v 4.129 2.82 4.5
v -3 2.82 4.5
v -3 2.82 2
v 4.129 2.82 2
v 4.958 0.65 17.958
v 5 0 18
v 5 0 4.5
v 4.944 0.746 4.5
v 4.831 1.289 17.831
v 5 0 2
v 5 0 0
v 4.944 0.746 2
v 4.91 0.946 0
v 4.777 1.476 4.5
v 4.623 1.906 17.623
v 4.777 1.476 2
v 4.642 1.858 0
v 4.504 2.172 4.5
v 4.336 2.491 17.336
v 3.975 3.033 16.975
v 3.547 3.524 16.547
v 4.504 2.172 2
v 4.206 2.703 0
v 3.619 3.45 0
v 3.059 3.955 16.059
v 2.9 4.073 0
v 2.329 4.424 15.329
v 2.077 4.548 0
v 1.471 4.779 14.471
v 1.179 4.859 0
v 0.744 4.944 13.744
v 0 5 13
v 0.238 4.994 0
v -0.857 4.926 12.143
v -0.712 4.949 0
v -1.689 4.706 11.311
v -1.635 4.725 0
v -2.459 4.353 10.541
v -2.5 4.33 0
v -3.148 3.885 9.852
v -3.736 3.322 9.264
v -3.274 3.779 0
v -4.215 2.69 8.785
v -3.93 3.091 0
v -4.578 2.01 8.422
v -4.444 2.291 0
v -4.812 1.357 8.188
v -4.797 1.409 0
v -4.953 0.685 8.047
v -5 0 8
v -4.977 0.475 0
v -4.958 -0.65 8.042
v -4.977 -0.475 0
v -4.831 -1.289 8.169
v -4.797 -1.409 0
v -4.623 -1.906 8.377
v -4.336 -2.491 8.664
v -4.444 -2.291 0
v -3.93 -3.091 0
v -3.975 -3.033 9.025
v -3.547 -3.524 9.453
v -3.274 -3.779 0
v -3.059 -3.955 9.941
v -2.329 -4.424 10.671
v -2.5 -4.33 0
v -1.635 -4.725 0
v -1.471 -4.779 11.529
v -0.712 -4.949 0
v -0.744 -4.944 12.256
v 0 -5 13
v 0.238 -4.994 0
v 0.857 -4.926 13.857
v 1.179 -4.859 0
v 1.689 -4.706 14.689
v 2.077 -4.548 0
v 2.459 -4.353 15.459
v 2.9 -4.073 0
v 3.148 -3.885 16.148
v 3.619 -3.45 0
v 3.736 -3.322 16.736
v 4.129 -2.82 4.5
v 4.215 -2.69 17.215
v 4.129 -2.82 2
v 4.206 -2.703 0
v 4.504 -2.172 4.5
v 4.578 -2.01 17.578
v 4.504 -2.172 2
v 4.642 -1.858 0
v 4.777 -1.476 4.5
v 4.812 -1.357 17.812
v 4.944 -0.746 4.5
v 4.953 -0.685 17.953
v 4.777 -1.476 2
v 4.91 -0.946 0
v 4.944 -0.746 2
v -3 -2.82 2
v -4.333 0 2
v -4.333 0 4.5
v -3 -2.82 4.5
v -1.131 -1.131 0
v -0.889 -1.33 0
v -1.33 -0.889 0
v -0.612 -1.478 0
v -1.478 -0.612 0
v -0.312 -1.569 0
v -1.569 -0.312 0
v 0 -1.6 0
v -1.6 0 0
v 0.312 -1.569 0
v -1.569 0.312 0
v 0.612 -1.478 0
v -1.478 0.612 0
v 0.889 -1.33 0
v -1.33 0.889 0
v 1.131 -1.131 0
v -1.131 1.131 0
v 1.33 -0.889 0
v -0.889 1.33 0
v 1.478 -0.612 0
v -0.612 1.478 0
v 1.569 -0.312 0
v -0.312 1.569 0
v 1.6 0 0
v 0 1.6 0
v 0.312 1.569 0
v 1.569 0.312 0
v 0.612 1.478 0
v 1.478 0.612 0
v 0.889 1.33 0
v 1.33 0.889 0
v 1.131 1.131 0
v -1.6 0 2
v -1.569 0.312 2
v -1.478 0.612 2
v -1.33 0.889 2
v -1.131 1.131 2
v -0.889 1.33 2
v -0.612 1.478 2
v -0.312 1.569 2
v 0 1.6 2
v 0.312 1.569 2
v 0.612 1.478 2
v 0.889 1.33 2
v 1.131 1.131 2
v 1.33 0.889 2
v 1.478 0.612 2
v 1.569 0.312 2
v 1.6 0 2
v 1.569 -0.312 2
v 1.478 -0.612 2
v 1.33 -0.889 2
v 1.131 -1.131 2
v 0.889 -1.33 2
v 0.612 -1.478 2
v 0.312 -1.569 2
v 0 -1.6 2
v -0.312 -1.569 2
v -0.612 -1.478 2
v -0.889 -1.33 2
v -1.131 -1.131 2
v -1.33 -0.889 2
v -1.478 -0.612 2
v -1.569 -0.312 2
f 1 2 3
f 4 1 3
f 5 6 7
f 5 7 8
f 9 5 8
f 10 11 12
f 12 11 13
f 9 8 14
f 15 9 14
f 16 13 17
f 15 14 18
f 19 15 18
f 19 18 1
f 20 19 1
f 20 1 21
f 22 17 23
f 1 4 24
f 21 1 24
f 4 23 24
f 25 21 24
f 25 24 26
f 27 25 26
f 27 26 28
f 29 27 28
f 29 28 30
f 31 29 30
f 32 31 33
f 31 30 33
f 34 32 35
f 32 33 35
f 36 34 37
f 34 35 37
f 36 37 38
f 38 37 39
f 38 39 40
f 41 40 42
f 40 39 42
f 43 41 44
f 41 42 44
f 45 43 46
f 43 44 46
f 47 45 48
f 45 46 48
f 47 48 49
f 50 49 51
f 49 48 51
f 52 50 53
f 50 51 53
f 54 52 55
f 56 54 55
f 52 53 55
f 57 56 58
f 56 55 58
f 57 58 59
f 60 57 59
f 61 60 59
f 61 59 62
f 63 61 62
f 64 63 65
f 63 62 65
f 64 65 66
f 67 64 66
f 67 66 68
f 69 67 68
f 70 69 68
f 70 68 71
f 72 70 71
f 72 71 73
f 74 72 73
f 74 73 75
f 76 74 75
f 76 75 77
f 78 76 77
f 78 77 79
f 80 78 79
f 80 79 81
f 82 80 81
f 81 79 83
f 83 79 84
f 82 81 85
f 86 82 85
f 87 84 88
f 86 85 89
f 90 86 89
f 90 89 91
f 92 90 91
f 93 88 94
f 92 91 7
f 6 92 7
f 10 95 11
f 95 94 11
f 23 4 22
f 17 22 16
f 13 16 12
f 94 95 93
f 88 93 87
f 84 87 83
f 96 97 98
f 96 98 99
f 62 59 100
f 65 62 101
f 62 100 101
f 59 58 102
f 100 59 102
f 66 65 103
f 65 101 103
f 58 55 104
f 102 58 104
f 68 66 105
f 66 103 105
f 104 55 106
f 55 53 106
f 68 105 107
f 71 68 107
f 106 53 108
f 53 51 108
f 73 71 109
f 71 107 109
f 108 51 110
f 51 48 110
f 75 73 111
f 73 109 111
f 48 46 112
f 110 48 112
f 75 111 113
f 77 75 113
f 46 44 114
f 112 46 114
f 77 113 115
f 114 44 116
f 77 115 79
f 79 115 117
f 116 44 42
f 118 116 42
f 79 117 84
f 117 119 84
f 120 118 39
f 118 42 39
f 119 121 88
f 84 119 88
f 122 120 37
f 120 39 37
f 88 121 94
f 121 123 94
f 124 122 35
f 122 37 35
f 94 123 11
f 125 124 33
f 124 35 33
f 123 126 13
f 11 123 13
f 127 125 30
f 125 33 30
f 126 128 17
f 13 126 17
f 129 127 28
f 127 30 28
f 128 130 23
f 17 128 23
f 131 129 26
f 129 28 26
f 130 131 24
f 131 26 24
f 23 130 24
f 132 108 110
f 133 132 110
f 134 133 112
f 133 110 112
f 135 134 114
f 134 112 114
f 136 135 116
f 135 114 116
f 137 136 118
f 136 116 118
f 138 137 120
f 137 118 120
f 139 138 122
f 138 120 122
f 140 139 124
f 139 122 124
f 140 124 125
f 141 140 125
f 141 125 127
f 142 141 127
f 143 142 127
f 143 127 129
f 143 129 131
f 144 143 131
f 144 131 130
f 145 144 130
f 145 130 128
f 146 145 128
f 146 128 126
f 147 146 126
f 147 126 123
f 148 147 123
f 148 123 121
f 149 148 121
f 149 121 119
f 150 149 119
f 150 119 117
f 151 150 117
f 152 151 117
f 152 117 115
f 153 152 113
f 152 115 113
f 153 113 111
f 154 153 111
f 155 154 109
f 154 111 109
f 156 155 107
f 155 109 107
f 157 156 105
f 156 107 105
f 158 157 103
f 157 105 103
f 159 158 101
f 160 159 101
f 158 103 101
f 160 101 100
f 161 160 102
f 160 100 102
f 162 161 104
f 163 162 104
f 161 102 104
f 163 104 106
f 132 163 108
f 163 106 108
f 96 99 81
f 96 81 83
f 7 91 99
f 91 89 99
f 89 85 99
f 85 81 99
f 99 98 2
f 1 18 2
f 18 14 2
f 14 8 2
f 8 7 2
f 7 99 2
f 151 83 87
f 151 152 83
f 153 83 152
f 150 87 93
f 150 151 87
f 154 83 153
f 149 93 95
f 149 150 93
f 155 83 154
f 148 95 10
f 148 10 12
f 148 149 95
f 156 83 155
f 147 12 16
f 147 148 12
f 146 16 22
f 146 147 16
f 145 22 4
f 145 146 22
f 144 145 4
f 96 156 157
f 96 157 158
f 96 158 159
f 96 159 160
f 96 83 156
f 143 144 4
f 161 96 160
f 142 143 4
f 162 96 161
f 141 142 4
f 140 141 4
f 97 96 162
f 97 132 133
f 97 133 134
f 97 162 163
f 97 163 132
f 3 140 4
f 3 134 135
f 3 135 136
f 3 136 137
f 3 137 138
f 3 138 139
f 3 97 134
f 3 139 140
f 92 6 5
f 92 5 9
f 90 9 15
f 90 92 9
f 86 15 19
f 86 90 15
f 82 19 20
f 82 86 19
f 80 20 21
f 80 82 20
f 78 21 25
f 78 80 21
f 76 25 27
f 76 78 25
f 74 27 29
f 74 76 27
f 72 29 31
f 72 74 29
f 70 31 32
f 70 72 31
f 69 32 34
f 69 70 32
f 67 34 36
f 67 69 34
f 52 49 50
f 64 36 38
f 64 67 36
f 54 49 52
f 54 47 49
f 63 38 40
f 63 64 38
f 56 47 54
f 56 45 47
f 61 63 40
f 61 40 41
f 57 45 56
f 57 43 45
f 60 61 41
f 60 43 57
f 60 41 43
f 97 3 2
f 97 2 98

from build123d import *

# Parameters (mm, degrees)
SZKIC1_R                        = 5
DODANIE_WYCI_GNI_CIE1_DEPTH     = 18
WYTNIJ_WYCI_GNI_CIE1_DEPTH      = 5
WYTNIJ_WYCI_GNI_CIE1_DEPTH_BACK = 5
WYTNIJ_WYCI_GNI_CIE2_DEPTH      = 5
WYTNIJ_WYCI_GNI_CIE2_DEPTH_BACK = 3
SZKIC3_W                        = 2.5
SZKIC3_H                        = 5.64
WYTNIJ_WYCI_GNI_CIE3_REACH      = 21.339
SZKIC4_R                        = 1.6
WYTNIJ_WYCI_GNI_CIE4_DEPTH      = 2.5


with BuildPart() as part:
    # Szkic1 → Dodanie-wyciągnięcie1 (new body)
    with BuildSketch(Plane.XY):
        Circle(SZKIC1_R)
    extrude(amount=DODANIE_WYCI_GNI_CIE1_DEPTH)

    # Szkic2 → Wytnij-wyciągnięcie1 (cut, two sides: drawn at the far end of the back side and taken through both)
    with BuildSketch(Plane(origin=(0, 0, 0), x_dir=(1, 0, 0), z_dir=(0, 1, 0)).offset(-WYTNIJ_WYCI_GNI_CIE1_DEPTH_BACK)):
        Polygon((-5, -18), (5, -18), (-5, -8), align=None)
    extrude(amount=WYTNIJ_WYCI_GNI_CIE1_DEPTH + WYTNIJ_WYCI_GNI_CIE1_DEPTH_BACK, mode=Mode.SUBTRACT)

    # Szkic3 → Wytnij-wyciągnięcie2 (cut, two sides: drawn at the far end of the back side and taken through both)
    with BuildSketch(Plane(origin=(0, 0, 0), x_dir=(0, 0, -1), z_dir=(1, 0, 0)).offset(-WYTNIJ_WYCI_GNI_CIE2_DEPTH_BACK)):
        with Locations((-3.25, 0)):
            Rectangle(SZKIC3_W, SZKIC3_H)
    extrude(amount=WYTNIJ_WYCI_GNI_CIE2_DEPTH + WYTNIJ_WYCI_GNI_CIE2_DEPTH_BACK, mode=Mode.SUBTRACT)

    # Szkic4 → Wytnij-wyciągnięcie3 (cut, up to next)
    with BuildSketch(Plane(origin=(0, 0, 0), x_dir=(-1, 0, 0), z_dir=(0, 0, -1)), mode=Mode.PRIVATE) as wytnij_wyci_gni_cie3_sk1:
        Circle(SZKIC4_R)
    wytnij_wyci_gni_cie3_tool1 = extrude(wytnij_wyci_gni_cie3_sk1.sketch, amount=-WYTNIJ_WYCI_GNI_CIE3_REACH, mode=Mode.PRIVATE) & part.part
    add(wytnij_wyci_gni_cie3_tool1.solids().sort_by_distance((0, 0, 0))[0], mode=Mode.SUBTRACT)

    # Szkic5 → Wytnij-wyciągnięcie4 (cut)
    with BuildSketch(Plane.XY.offset(2)):
        Polygon((-3, -2.82), (-3, 2.82), (-4.333128401, 0), align=None)
    extrude(amount=WYTNIJ_WYCI_GNI_CIE4_DEPTH, mode=Mode.SUBTRACT)


solid = part.part
